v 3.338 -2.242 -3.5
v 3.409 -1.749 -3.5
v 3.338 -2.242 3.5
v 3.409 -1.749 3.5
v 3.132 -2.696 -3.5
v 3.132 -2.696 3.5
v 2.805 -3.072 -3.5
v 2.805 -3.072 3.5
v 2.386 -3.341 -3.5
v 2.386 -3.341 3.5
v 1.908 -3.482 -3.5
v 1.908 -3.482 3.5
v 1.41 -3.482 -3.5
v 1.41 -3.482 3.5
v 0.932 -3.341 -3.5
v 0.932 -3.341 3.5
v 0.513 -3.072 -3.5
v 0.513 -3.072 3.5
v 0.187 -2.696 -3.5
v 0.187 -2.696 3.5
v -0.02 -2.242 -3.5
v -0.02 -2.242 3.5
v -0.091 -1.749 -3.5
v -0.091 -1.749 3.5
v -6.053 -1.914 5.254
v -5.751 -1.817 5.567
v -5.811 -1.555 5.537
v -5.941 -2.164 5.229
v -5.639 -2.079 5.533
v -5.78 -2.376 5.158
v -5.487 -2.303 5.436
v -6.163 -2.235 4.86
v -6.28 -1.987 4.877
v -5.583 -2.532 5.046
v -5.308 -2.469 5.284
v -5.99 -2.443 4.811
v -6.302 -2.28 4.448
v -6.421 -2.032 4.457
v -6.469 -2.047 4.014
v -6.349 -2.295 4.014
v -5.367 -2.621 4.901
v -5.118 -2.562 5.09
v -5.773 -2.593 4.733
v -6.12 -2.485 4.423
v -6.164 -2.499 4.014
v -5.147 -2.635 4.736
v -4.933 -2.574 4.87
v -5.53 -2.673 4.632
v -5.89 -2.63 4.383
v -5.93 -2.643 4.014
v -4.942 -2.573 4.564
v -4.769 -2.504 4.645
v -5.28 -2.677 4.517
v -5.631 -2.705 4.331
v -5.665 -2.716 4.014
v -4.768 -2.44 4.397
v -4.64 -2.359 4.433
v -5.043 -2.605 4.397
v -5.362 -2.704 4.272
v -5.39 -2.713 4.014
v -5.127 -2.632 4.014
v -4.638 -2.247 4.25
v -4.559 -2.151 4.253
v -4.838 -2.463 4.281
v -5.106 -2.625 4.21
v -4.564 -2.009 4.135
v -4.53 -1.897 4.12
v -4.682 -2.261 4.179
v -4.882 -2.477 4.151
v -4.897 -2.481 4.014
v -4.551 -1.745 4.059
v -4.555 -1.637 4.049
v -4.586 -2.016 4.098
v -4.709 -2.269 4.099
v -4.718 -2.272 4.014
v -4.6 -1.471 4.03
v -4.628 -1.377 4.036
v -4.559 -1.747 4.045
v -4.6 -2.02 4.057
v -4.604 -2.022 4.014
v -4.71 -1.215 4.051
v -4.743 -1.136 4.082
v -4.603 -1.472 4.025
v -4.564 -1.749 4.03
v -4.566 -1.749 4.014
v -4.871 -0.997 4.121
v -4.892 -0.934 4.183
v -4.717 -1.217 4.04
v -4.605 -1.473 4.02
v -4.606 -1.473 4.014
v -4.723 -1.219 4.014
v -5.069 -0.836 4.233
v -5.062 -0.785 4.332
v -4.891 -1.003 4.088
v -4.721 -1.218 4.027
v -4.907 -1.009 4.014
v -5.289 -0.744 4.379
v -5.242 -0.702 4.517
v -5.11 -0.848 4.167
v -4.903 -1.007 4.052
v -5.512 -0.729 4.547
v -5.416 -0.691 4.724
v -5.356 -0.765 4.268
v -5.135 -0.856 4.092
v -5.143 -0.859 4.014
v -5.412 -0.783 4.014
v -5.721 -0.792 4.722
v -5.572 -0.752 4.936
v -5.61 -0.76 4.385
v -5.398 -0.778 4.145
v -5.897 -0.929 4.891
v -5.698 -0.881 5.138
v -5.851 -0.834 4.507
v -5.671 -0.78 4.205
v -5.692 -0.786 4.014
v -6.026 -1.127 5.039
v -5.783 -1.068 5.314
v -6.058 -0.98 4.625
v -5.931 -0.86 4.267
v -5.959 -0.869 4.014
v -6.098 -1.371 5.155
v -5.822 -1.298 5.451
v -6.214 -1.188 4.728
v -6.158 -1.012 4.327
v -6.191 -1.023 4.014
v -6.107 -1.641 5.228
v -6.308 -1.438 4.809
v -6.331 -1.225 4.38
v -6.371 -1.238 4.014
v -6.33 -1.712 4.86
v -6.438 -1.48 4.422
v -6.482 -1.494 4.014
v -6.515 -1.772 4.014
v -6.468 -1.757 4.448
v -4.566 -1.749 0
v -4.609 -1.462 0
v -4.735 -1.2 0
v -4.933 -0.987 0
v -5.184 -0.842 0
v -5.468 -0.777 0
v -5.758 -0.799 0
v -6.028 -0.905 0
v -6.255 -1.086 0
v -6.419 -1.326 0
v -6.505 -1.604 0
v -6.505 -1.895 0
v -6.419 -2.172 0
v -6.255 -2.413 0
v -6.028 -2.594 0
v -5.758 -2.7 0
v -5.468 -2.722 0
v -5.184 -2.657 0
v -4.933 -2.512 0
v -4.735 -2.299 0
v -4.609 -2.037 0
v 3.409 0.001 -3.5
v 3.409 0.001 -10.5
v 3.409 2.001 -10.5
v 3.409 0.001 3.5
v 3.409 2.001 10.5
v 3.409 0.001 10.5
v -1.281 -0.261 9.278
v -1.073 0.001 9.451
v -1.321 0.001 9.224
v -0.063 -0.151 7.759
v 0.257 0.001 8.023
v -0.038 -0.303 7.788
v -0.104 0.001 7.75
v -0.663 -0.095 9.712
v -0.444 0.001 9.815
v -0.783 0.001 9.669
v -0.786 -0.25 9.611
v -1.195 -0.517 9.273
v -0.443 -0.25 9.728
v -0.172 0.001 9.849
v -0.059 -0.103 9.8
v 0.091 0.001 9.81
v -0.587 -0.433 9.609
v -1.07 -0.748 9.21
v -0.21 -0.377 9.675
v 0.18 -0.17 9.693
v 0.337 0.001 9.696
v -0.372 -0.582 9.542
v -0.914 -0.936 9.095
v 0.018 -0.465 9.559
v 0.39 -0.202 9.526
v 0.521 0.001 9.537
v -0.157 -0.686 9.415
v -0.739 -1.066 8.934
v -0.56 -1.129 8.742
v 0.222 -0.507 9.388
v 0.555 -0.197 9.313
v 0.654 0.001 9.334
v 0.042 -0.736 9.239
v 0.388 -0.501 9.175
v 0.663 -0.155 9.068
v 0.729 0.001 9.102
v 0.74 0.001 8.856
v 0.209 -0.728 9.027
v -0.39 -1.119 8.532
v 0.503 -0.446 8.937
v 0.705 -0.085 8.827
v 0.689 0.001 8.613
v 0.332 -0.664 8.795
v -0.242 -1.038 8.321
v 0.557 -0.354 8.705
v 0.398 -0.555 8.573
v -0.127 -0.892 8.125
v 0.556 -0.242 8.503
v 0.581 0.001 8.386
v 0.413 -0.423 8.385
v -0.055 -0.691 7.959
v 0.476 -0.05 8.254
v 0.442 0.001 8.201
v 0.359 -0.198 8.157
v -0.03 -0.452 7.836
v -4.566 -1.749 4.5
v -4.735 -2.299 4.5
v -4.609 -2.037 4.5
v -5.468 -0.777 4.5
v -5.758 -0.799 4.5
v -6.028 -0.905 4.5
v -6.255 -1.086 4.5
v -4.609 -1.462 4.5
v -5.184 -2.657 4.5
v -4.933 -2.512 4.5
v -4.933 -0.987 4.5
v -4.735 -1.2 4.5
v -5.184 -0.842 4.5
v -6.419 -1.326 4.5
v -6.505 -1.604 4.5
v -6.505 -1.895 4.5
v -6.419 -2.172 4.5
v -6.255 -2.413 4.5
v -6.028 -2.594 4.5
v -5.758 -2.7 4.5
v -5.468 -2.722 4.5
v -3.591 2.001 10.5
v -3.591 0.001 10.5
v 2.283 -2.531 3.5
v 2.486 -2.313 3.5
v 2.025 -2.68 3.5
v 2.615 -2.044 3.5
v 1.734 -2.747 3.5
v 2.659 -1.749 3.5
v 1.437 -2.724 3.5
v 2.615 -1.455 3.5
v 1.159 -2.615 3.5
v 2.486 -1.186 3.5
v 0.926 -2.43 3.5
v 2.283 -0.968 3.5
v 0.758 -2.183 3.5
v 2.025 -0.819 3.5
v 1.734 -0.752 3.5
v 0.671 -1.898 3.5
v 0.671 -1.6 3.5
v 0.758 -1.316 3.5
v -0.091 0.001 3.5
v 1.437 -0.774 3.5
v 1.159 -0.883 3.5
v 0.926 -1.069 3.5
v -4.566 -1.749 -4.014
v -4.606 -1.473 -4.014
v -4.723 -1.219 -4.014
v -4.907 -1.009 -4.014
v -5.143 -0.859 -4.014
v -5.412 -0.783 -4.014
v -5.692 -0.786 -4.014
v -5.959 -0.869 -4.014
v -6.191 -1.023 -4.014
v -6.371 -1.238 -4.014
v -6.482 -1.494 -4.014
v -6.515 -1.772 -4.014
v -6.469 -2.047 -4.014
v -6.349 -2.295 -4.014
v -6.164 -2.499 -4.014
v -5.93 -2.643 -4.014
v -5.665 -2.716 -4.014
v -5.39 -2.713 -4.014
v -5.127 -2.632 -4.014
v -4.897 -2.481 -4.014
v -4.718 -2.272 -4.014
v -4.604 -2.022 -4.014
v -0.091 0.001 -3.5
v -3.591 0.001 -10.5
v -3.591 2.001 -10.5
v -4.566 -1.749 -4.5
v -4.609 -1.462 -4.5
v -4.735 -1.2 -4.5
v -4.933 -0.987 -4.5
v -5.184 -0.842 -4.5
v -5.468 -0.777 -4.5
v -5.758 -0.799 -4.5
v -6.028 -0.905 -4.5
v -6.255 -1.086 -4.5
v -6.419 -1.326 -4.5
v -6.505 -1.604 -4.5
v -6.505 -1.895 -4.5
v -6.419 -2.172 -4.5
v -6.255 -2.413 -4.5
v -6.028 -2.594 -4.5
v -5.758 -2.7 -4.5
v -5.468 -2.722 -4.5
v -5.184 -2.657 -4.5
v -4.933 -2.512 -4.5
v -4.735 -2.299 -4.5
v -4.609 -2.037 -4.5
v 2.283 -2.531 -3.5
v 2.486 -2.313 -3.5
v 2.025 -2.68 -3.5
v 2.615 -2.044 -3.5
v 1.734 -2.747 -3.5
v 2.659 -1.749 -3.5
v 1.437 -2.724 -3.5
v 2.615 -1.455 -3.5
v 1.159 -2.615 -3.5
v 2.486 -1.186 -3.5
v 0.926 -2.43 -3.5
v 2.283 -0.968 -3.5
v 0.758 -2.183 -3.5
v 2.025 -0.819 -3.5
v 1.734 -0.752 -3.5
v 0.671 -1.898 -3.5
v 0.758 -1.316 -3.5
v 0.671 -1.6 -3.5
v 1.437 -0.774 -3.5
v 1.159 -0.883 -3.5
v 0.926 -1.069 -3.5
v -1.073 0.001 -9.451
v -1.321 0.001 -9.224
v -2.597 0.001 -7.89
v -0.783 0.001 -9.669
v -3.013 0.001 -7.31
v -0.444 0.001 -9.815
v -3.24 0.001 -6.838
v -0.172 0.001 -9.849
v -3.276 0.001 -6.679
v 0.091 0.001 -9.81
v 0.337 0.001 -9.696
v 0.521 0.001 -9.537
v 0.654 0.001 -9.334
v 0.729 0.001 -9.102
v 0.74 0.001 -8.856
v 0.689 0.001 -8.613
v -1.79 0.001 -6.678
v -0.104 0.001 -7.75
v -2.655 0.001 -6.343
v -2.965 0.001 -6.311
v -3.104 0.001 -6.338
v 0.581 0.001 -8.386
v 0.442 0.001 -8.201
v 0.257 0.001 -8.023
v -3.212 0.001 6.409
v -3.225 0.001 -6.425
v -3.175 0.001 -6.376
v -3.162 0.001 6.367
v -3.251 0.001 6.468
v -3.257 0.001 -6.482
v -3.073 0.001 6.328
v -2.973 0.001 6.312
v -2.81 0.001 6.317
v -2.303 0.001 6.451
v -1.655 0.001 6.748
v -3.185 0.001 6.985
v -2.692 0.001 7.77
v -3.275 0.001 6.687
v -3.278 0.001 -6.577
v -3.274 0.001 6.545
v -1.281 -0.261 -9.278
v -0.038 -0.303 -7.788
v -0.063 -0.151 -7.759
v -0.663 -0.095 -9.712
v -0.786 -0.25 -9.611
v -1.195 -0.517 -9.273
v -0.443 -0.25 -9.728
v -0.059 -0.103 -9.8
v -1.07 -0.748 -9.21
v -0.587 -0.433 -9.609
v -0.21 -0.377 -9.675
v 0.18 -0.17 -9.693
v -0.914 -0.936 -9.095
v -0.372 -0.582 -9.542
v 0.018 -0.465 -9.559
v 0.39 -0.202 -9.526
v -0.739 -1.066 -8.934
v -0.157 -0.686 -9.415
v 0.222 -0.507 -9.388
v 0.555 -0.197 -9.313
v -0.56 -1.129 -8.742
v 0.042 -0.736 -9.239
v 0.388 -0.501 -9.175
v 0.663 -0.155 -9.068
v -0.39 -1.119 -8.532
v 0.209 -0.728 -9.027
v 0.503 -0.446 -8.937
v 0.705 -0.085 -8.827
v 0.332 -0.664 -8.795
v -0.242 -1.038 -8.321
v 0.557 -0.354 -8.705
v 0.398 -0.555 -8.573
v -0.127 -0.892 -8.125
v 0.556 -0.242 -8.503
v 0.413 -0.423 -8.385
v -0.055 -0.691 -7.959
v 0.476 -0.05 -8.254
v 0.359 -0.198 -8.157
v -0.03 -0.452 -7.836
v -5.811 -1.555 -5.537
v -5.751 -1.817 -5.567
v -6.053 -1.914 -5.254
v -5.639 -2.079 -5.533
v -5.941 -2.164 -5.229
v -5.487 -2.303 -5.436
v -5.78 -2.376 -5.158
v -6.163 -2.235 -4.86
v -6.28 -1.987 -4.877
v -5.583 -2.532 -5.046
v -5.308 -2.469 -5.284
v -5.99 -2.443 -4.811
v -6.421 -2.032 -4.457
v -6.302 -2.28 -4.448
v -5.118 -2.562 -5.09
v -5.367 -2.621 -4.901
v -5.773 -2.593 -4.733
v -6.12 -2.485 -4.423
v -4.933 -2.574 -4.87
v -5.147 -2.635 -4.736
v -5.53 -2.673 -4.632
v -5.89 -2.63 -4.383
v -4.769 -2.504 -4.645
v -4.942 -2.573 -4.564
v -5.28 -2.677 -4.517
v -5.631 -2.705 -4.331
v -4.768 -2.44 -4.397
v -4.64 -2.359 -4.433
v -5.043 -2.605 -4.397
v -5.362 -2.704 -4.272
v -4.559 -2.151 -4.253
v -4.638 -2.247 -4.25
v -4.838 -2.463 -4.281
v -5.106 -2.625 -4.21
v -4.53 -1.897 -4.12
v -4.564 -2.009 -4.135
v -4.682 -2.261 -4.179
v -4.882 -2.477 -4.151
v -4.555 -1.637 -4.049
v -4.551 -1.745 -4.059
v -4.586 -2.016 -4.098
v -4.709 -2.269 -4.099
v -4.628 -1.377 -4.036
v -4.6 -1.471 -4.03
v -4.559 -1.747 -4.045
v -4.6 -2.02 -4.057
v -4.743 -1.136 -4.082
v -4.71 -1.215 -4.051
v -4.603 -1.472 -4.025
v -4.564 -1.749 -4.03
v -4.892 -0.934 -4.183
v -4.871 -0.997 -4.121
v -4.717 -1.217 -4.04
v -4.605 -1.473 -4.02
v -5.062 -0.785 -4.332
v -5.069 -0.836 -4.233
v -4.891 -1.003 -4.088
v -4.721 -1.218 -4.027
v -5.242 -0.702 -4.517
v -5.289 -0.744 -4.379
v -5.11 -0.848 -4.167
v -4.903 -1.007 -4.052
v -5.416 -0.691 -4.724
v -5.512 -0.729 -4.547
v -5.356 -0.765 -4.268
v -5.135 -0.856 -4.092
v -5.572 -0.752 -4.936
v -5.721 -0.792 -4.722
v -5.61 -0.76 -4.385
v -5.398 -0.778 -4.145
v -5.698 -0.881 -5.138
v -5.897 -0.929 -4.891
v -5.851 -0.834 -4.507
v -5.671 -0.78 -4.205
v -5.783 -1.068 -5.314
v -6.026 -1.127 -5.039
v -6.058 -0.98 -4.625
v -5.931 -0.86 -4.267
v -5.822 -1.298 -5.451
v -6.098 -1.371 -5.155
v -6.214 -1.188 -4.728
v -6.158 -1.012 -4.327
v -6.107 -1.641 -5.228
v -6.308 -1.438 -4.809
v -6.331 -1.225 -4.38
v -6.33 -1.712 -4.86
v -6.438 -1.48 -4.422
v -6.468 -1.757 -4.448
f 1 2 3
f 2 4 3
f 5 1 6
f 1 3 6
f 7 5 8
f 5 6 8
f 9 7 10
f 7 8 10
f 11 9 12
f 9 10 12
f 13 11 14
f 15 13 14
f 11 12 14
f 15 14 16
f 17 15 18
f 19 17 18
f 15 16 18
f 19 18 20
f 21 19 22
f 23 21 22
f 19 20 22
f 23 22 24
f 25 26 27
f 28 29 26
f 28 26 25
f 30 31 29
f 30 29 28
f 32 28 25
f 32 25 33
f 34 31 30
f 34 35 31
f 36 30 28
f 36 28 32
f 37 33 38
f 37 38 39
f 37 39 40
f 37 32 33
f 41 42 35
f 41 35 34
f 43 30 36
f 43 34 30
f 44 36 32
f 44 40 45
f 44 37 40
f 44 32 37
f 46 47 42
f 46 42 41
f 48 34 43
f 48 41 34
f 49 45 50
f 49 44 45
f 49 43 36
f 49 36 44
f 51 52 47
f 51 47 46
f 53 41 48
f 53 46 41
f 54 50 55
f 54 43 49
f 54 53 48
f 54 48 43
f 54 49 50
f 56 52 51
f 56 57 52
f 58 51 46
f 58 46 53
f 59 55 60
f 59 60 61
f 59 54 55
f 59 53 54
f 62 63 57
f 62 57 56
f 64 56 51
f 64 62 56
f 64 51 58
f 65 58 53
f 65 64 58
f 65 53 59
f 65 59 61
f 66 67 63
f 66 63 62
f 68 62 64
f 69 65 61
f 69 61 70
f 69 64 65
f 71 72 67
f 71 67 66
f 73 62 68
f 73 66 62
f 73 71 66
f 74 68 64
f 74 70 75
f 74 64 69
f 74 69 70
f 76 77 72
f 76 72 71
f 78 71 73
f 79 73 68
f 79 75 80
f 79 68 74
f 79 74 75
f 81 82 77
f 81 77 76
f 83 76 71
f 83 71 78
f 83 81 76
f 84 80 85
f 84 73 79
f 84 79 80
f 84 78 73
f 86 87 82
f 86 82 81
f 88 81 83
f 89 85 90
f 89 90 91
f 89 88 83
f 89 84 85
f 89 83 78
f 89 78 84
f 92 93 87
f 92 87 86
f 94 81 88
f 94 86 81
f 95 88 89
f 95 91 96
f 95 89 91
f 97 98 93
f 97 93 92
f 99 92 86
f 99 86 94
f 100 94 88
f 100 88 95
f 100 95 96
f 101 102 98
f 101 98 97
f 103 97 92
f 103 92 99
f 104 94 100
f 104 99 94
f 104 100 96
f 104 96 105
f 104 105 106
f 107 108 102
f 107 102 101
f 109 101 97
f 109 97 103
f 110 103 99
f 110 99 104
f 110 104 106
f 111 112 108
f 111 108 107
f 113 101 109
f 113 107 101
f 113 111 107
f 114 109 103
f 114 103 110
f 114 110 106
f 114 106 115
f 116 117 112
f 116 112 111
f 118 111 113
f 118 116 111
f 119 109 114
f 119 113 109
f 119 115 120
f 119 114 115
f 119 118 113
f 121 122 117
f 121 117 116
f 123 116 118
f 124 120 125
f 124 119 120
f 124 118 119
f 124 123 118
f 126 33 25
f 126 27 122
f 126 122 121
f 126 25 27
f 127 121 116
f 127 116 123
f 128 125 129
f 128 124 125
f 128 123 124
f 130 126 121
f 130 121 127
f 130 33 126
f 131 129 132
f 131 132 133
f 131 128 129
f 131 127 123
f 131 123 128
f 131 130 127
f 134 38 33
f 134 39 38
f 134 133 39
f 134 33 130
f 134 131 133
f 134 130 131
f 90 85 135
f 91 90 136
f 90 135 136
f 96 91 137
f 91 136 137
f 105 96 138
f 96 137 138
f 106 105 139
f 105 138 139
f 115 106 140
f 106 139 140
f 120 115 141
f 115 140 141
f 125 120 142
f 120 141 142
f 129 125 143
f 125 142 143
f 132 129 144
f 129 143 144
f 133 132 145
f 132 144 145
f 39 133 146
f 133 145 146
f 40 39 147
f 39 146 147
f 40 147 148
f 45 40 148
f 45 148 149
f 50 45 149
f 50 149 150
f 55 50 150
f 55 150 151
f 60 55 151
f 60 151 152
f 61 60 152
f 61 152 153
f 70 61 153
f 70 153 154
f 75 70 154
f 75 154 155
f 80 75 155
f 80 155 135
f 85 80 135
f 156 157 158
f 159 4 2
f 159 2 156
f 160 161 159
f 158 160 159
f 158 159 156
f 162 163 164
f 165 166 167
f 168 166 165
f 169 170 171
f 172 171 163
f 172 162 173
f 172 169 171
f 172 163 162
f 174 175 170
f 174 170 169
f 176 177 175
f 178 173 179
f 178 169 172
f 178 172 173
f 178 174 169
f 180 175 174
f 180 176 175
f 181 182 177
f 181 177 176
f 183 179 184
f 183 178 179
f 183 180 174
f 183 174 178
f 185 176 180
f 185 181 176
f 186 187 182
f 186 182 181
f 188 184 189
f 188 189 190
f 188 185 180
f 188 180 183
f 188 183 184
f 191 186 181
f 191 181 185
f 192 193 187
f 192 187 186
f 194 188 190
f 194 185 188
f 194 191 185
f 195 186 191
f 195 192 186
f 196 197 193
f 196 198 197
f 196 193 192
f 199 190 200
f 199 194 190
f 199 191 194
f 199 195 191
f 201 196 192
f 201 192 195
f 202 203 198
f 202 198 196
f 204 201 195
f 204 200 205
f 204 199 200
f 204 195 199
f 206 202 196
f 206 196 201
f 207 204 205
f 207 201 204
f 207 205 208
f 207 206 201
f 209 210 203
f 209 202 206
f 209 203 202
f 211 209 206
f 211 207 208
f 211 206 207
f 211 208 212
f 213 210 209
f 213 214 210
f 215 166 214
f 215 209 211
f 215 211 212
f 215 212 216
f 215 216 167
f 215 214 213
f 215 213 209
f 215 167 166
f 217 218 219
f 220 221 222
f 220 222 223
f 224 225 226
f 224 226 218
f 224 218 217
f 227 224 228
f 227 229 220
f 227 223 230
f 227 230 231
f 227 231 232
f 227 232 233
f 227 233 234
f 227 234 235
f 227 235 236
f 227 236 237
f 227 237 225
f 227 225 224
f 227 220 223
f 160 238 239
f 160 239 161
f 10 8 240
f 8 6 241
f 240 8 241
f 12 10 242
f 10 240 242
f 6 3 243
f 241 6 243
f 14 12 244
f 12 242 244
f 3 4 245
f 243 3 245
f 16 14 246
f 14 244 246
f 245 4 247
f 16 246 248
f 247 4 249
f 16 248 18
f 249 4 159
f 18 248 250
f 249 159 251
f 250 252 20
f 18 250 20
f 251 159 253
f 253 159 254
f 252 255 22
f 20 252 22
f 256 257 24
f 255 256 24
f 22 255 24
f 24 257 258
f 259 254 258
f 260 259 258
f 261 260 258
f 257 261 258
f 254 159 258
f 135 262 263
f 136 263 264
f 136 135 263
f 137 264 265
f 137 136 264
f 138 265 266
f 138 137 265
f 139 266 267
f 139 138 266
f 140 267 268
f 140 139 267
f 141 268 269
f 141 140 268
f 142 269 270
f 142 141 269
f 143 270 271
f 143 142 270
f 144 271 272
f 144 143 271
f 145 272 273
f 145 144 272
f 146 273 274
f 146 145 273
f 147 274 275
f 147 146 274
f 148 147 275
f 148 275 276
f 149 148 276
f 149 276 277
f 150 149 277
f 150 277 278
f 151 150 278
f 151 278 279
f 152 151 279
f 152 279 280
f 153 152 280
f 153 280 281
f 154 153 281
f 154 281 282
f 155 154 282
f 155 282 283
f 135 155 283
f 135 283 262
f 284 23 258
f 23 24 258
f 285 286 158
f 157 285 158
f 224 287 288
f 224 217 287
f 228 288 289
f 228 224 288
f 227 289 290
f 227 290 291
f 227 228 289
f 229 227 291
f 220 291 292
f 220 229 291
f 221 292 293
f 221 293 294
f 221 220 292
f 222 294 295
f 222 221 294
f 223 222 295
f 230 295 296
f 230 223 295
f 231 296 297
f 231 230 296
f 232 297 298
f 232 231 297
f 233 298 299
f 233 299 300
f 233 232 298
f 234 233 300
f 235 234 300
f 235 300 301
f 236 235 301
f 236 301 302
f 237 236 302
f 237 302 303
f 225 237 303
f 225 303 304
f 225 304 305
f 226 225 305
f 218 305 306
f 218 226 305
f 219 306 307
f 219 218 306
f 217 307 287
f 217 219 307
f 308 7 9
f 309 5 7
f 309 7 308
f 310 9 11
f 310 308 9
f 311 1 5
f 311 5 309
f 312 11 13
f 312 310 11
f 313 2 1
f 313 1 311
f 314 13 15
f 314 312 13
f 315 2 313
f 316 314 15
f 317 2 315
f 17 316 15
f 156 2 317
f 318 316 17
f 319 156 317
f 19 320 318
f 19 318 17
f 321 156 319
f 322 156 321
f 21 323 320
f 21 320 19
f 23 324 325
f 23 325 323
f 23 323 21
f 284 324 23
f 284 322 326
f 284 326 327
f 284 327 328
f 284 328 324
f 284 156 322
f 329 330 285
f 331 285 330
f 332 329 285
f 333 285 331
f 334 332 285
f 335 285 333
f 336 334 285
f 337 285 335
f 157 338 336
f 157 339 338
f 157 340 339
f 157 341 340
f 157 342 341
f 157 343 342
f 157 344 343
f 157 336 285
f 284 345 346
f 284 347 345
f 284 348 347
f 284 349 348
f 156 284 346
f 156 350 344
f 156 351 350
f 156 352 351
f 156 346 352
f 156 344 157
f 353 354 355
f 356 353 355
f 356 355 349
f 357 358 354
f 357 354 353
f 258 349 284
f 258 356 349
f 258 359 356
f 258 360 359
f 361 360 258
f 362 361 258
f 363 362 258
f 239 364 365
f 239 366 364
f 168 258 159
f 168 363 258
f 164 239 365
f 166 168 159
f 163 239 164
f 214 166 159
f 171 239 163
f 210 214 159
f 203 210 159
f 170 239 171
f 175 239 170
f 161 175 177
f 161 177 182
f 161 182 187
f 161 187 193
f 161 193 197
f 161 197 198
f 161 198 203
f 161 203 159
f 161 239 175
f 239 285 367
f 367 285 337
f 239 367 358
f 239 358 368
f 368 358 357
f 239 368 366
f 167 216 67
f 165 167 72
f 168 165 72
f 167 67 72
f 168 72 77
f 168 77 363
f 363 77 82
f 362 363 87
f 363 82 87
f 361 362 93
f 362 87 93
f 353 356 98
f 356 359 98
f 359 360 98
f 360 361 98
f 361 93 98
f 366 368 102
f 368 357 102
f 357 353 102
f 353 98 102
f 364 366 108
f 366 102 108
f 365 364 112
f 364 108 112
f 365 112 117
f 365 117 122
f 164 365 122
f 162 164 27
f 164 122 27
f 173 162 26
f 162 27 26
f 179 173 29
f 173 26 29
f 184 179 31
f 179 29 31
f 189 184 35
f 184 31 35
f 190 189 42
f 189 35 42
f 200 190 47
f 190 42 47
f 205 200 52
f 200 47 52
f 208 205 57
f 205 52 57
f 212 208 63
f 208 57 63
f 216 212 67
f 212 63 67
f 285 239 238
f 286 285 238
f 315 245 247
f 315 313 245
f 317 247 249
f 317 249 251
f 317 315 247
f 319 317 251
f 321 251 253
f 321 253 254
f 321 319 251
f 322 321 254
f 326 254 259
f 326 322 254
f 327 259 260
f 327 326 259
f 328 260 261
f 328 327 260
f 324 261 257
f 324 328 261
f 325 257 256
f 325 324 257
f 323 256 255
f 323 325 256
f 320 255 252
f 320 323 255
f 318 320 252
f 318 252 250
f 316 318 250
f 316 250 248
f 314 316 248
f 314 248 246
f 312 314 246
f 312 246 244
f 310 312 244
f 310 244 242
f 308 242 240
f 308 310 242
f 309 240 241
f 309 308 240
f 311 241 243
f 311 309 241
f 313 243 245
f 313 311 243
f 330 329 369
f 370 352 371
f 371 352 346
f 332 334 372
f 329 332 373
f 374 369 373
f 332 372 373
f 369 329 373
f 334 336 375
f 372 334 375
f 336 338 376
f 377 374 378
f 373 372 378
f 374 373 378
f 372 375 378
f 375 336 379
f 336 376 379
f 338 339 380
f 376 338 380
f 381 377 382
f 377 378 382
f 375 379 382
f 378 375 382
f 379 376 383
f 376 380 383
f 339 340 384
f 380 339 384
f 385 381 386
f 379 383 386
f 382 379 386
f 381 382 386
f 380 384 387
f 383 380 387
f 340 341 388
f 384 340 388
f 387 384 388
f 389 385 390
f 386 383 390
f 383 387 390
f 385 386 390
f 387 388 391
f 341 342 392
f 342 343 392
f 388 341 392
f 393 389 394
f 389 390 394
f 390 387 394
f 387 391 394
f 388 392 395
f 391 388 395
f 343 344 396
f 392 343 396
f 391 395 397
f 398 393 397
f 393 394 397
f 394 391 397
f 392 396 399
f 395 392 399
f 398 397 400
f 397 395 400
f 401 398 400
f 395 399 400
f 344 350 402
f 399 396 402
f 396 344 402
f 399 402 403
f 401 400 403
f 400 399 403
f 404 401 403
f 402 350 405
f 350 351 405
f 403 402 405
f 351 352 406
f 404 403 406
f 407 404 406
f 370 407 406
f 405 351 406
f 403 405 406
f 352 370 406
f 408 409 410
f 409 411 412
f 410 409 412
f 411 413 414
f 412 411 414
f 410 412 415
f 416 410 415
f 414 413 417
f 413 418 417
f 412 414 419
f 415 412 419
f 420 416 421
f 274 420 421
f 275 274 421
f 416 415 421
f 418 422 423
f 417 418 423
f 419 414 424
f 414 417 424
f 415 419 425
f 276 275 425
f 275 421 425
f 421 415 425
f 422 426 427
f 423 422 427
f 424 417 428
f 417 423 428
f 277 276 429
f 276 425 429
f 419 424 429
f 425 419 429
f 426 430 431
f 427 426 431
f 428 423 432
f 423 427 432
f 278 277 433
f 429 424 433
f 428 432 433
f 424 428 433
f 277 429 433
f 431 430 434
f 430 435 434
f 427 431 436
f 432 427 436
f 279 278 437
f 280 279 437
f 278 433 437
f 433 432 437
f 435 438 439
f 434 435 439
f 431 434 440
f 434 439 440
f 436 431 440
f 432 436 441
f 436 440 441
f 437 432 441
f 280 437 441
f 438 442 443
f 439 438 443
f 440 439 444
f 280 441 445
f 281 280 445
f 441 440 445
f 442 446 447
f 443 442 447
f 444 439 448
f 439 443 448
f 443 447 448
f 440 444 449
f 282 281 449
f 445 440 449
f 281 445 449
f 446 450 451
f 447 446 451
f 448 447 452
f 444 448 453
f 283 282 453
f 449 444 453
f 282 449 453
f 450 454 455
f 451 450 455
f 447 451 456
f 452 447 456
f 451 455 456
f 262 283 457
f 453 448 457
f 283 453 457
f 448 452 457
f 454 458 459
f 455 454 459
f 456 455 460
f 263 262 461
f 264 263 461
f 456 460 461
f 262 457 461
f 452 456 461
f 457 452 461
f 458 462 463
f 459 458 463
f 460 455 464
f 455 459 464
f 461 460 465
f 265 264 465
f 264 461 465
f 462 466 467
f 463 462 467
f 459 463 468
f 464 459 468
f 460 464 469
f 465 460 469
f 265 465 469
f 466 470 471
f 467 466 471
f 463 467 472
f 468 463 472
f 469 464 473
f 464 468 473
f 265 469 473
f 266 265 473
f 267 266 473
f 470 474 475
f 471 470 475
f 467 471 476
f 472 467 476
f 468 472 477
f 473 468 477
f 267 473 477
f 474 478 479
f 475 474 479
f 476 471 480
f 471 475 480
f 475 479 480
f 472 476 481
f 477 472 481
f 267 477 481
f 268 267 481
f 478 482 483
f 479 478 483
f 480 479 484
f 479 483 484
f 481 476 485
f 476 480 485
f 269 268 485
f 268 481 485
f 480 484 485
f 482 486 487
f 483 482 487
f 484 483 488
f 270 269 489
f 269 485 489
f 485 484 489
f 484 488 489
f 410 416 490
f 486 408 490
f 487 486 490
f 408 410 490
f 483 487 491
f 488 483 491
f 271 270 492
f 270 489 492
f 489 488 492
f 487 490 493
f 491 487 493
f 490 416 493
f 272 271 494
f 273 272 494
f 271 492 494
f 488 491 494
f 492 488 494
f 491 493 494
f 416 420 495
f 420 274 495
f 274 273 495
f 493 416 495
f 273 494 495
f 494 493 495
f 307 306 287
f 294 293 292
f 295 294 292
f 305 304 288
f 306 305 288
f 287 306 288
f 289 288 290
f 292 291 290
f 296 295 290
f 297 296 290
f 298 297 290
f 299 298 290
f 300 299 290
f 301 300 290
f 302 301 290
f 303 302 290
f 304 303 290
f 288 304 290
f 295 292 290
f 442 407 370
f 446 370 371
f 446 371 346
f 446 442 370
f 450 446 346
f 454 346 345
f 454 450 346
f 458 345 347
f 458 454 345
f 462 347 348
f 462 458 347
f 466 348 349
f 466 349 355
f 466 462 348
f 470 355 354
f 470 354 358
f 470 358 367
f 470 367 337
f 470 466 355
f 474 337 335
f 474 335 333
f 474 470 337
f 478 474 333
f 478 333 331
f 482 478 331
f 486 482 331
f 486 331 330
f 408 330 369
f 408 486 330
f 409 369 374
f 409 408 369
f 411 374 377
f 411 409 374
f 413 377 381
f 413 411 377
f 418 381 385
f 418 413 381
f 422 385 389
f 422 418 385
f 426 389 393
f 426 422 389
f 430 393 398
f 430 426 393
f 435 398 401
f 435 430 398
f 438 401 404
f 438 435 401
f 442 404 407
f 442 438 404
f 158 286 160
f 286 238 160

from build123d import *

# Parameters (mm, degrees)
SKETCH1_W           = 7
SKETCH1_H           = 2
BOSS_EXTRUDE1_DEPTH = 10.5
SKETCH2_R           = 1
BOSS_EXTRUDE2_DEPTH = 3.5
SKETCH3_R           = 0.975
BOSS_EXTRUDE3_DEPTH = 4.5
SWEEP1_ANGLE        = 52.758136
SWEEP1_2_OUTLINE_R  = 0.975
SWEEP1_2_ANGLE      = 51.827212
SWEEP1_START        = -1.300671735
SWEEP1_3_OUTLINE_R  = 0.975
SWEEP1_3_DEPTH      = 6.012679668
SWEEP1_4_OUTLINE_R  = 0.975
SWEEP1_4_DEPTH      = 4.014132691


with BuildPart() as part:
    # Sketch1 → Boss-Extrude1 (new, symmetric)
    with BuildSketch(Plane.XY):
        with Locations((-0.090659996, 1.000603453)):
            Rectangle(SKETCH1_W, SKETCH1_H)
    extrude(amount=BOSS_EXTRUDE1_DEPTH, both=True)

    # Sketch2 → Boss-Extrude2 (add, symmetric)
    with BuildSketch(Plane.XY):
        with BuildLine():
            Line((3.409340004, 0.000603453), (3.409340004, -1.749396547))
            ThreePointArc((3.409340004, -1.749396547), (1.659340004, -3.499396547), (-0.090659996, -1.749396547))
            Line((-0.090659996, -1.749396547), (-0.090659996, 0.000603453))
            Line((-0.090659996, 0.000603453), (3.409340004, 0.000603453))
        make_face()
        with Locations((1.659340004, -1.749396547)):
            Circle(SKETCH2_R, mode=Mode.SUBTRACT)
    extrude(amount=BOSS_EXTRUDE2_DEPTH, both=True)

    # Sweep1: read off the stored shape, not the designer's step
    # Sweep1 outline → Sweep1 (revolve)
    with BuildSketch(Plane(origin=(3.593677223, 0.783196597, 2.967256422), x_dir=(0.7080400901637386, -0.39610400747133684, 0.5846202579333633), z_dir=(0.3054408532938203, 0.9182056497676037, 0.2521988696921456))):
        with BuildLine():
            Line((0.806226014, -6.042187467), (0.806225946, -7.953288333))
            ThreePointArc((0.806225946, -7.953288333), (1.975, -6.997737942), (0.806226014, -6.042187467))
        make_face()
    sweep1 = revolve(axis=Axis((3.593677223, 0.783196597, 2.967256422), (0.6366986067678082, 0, -0.7711127570854551)), revolution_arc=SWEEP1_ANGLE)

    # Sweep1 2 outline → Sweep1 2 (revolve)
    with BuildSketch(Plane(origin=(-4.579891067, -1.470607223, 4.014132591), x_dir=(-0.5884431979545631, -0.18894965071935535, 0.7861505150249796), z_dir=(0.7485091599062733, 0.24034697795155588, 0.6180350861609393))):
        with Locations((1, -0.028291715)):
            Circle(SWEEP1_2_OUTLINE_R)
    sweep1_2 = revolve(axis=Axis((-4.579891067, -1.470607223, 4.014132591), (0.3057264141637292, -0.9521194041098986, 0)), revolution_arc=SWEEP1_2_ANGLE)

    # Sweep1 3 outline → Sweep1 3 (add)
    with BuildSketch(Plane(origin=(0, 0, 0), x_dir=(0.6631244510169609, -0.2712943464482258, -0.69761403372401), z_dir=(0.7485091599061792, 0.24034697795152507, 0.6180350861610652)).offset(SWEEP1_START)):
        with Locations((-6.338808877, -3.261453929)):
            Circle(SWEEP1_3_OUTLINE_R)
    sweep1_3 = extrude(amount=SWEEP1_3_DEPTH)

    # Sweep1 4 outline → Sweep1 4 (add)
    with BuildSketch(Plane.XY):
        with Locations((-5.540659996, -1.749396547)):
            Circle(SWEEP1_4_OUTLINE_R)
    sweep1_4 = extrude(amount=SWEEP1_4_DEPTH)

    # Mirror1: Sweep1, Sweep1 2, Sweep1 3, Sweep1 4 across plane
    add(sweep1.mirror(Plane.XY))
    add(sweep1_2.mirror(Plane.XY))
    add(sweep1_3.mirror(Plane.XY))
    add(sweep1_4.mirror(Plane.XY))


with BuildPart() as body_2:
    # Sketch3 → Boss-Extrude3 (new, symmetric)
    with BuildSketch(Plane.XY):
        with Locations((-5.540659996, -1.749396547)):
            Circle(SKETCH3_R)
    extrude(amount=BOSS_EXTRUDE3_DEPTH, both=True)


solid = Compound([part.part, body_2.part])
